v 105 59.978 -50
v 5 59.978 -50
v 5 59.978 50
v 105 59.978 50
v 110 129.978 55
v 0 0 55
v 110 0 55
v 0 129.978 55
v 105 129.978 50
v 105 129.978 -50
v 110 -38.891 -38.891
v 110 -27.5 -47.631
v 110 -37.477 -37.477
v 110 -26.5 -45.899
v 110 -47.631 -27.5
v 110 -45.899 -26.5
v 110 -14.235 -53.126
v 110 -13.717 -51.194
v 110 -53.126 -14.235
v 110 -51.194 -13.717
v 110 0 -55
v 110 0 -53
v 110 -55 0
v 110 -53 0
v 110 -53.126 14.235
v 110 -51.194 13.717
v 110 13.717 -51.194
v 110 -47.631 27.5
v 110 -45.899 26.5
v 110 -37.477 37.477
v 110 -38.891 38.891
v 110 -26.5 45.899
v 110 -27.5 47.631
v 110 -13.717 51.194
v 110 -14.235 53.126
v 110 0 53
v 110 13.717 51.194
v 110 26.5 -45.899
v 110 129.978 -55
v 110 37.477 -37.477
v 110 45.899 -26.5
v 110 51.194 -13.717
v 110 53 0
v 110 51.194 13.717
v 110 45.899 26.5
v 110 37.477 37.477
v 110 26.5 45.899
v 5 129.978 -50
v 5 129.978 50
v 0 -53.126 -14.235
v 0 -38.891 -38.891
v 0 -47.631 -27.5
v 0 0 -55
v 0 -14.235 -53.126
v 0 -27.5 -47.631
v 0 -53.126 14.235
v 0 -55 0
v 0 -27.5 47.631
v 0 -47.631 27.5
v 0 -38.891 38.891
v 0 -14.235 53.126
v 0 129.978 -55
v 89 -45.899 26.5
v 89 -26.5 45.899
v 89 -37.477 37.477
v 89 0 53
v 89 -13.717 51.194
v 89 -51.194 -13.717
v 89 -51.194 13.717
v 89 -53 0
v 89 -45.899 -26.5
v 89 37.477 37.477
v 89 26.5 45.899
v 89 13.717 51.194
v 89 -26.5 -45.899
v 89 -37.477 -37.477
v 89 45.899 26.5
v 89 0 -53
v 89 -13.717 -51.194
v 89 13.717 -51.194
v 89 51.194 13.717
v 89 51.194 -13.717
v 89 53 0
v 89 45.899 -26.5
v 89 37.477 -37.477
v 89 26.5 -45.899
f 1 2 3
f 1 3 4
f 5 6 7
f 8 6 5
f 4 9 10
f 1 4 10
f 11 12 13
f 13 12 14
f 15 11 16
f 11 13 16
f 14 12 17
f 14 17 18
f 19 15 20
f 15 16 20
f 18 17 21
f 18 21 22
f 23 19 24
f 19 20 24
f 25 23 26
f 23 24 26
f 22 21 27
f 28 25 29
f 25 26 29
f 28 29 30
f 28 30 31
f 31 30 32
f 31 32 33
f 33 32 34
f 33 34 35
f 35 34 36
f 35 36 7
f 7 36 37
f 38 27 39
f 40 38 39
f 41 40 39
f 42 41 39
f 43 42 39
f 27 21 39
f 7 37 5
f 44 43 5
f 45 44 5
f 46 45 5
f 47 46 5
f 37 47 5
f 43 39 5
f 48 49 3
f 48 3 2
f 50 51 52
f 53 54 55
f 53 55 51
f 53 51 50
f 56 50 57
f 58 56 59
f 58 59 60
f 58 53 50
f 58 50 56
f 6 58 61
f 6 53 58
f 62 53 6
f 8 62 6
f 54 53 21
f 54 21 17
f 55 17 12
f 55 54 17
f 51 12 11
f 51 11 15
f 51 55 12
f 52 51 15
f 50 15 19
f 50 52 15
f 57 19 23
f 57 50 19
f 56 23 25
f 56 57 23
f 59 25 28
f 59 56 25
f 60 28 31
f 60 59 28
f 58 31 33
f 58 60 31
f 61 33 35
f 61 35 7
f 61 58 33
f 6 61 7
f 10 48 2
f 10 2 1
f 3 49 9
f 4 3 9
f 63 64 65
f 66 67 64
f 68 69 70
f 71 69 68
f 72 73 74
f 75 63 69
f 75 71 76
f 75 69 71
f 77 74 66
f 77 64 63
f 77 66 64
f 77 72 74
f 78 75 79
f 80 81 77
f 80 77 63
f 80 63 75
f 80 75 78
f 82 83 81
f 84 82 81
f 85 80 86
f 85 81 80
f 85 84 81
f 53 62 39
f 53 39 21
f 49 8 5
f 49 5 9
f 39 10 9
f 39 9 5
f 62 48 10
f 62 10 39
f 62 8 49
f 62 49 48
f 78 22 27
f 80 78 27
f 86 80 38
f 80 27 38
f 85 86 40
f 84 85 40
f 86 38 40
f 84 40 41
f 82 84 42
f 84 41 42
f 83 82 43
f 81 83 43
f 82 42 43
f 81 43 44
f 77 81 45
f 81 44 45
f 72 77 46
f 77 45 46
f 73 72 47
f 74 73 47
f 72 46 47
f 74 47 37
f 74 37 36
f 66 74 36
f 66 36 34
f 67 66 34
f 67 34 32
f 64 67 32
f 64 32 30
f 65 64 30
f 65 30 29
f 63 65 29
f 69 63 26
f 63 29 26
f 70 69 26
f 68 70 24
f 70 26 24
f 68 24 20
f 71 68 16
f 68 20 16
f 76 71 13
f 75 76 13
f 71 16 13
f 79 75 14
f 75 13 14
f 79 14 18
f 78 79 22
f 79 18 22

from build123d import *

# Parameters (mm, degrees)
BOSS_EXTRUDE1_DEPTH = 110
SKETCH2_W           = 100
SKETCH2_H           = 100
CUT_EXTRUDE1_DEPTH  = 70
SKETCH3_R           = 53
CUT_EXTRUDE2_DEPTH  = 21


with BuildPart() as part:
    # Sketch1 → Boss-Extrude1 (new body)
    with BuildSketch(Plane(origin=(0, 0, 0), x_dir=(0, 0, -1), z_dir=(1, 0, 0))):
        with BuildLine():
            Line((55, 129.977668722), (55, -2.75e-07))
            ThreePointArc((55, -2.75e-07), (-2.948e-06, -55), (-55, 5.622e-06))
            Line((-55, 5.622e-06), (-55, 129.977668722))
            Line((-55, 129.977668722), (55, 129.977668722))
        make_face()
    extrude(amount=BOSS_EXTRUDE1_DEPTH)

    # Sketch2 → Cut-Extrude1 (cut)
    with BuildSketch(Plane(origin=(0, 129.977668722, 0), x_dir=(1, 0, 0), z_dir=(0, 1, 0))):
        with Locations((55, 0)):
            Rectangle(SKETCH2_W, SKETCH2_H)
    extrude(amount=-CUT_EXTRUDE1_DEPTH, mode=Mode.SUBTRACT)

    # Sketch3 → Cut-Extrude2 (cut)
    with BuildSketch(Plane(origin=(110, 0, 0), x_dir=(0, 0, -1), z_dir=(1, 0, 0))):
        Circle(SKETCH3_R)
    extrude(amount=-CUT_EXTRUDE2_DEPTH, mode=Mode.SUBTRACT)


solid = part.part
